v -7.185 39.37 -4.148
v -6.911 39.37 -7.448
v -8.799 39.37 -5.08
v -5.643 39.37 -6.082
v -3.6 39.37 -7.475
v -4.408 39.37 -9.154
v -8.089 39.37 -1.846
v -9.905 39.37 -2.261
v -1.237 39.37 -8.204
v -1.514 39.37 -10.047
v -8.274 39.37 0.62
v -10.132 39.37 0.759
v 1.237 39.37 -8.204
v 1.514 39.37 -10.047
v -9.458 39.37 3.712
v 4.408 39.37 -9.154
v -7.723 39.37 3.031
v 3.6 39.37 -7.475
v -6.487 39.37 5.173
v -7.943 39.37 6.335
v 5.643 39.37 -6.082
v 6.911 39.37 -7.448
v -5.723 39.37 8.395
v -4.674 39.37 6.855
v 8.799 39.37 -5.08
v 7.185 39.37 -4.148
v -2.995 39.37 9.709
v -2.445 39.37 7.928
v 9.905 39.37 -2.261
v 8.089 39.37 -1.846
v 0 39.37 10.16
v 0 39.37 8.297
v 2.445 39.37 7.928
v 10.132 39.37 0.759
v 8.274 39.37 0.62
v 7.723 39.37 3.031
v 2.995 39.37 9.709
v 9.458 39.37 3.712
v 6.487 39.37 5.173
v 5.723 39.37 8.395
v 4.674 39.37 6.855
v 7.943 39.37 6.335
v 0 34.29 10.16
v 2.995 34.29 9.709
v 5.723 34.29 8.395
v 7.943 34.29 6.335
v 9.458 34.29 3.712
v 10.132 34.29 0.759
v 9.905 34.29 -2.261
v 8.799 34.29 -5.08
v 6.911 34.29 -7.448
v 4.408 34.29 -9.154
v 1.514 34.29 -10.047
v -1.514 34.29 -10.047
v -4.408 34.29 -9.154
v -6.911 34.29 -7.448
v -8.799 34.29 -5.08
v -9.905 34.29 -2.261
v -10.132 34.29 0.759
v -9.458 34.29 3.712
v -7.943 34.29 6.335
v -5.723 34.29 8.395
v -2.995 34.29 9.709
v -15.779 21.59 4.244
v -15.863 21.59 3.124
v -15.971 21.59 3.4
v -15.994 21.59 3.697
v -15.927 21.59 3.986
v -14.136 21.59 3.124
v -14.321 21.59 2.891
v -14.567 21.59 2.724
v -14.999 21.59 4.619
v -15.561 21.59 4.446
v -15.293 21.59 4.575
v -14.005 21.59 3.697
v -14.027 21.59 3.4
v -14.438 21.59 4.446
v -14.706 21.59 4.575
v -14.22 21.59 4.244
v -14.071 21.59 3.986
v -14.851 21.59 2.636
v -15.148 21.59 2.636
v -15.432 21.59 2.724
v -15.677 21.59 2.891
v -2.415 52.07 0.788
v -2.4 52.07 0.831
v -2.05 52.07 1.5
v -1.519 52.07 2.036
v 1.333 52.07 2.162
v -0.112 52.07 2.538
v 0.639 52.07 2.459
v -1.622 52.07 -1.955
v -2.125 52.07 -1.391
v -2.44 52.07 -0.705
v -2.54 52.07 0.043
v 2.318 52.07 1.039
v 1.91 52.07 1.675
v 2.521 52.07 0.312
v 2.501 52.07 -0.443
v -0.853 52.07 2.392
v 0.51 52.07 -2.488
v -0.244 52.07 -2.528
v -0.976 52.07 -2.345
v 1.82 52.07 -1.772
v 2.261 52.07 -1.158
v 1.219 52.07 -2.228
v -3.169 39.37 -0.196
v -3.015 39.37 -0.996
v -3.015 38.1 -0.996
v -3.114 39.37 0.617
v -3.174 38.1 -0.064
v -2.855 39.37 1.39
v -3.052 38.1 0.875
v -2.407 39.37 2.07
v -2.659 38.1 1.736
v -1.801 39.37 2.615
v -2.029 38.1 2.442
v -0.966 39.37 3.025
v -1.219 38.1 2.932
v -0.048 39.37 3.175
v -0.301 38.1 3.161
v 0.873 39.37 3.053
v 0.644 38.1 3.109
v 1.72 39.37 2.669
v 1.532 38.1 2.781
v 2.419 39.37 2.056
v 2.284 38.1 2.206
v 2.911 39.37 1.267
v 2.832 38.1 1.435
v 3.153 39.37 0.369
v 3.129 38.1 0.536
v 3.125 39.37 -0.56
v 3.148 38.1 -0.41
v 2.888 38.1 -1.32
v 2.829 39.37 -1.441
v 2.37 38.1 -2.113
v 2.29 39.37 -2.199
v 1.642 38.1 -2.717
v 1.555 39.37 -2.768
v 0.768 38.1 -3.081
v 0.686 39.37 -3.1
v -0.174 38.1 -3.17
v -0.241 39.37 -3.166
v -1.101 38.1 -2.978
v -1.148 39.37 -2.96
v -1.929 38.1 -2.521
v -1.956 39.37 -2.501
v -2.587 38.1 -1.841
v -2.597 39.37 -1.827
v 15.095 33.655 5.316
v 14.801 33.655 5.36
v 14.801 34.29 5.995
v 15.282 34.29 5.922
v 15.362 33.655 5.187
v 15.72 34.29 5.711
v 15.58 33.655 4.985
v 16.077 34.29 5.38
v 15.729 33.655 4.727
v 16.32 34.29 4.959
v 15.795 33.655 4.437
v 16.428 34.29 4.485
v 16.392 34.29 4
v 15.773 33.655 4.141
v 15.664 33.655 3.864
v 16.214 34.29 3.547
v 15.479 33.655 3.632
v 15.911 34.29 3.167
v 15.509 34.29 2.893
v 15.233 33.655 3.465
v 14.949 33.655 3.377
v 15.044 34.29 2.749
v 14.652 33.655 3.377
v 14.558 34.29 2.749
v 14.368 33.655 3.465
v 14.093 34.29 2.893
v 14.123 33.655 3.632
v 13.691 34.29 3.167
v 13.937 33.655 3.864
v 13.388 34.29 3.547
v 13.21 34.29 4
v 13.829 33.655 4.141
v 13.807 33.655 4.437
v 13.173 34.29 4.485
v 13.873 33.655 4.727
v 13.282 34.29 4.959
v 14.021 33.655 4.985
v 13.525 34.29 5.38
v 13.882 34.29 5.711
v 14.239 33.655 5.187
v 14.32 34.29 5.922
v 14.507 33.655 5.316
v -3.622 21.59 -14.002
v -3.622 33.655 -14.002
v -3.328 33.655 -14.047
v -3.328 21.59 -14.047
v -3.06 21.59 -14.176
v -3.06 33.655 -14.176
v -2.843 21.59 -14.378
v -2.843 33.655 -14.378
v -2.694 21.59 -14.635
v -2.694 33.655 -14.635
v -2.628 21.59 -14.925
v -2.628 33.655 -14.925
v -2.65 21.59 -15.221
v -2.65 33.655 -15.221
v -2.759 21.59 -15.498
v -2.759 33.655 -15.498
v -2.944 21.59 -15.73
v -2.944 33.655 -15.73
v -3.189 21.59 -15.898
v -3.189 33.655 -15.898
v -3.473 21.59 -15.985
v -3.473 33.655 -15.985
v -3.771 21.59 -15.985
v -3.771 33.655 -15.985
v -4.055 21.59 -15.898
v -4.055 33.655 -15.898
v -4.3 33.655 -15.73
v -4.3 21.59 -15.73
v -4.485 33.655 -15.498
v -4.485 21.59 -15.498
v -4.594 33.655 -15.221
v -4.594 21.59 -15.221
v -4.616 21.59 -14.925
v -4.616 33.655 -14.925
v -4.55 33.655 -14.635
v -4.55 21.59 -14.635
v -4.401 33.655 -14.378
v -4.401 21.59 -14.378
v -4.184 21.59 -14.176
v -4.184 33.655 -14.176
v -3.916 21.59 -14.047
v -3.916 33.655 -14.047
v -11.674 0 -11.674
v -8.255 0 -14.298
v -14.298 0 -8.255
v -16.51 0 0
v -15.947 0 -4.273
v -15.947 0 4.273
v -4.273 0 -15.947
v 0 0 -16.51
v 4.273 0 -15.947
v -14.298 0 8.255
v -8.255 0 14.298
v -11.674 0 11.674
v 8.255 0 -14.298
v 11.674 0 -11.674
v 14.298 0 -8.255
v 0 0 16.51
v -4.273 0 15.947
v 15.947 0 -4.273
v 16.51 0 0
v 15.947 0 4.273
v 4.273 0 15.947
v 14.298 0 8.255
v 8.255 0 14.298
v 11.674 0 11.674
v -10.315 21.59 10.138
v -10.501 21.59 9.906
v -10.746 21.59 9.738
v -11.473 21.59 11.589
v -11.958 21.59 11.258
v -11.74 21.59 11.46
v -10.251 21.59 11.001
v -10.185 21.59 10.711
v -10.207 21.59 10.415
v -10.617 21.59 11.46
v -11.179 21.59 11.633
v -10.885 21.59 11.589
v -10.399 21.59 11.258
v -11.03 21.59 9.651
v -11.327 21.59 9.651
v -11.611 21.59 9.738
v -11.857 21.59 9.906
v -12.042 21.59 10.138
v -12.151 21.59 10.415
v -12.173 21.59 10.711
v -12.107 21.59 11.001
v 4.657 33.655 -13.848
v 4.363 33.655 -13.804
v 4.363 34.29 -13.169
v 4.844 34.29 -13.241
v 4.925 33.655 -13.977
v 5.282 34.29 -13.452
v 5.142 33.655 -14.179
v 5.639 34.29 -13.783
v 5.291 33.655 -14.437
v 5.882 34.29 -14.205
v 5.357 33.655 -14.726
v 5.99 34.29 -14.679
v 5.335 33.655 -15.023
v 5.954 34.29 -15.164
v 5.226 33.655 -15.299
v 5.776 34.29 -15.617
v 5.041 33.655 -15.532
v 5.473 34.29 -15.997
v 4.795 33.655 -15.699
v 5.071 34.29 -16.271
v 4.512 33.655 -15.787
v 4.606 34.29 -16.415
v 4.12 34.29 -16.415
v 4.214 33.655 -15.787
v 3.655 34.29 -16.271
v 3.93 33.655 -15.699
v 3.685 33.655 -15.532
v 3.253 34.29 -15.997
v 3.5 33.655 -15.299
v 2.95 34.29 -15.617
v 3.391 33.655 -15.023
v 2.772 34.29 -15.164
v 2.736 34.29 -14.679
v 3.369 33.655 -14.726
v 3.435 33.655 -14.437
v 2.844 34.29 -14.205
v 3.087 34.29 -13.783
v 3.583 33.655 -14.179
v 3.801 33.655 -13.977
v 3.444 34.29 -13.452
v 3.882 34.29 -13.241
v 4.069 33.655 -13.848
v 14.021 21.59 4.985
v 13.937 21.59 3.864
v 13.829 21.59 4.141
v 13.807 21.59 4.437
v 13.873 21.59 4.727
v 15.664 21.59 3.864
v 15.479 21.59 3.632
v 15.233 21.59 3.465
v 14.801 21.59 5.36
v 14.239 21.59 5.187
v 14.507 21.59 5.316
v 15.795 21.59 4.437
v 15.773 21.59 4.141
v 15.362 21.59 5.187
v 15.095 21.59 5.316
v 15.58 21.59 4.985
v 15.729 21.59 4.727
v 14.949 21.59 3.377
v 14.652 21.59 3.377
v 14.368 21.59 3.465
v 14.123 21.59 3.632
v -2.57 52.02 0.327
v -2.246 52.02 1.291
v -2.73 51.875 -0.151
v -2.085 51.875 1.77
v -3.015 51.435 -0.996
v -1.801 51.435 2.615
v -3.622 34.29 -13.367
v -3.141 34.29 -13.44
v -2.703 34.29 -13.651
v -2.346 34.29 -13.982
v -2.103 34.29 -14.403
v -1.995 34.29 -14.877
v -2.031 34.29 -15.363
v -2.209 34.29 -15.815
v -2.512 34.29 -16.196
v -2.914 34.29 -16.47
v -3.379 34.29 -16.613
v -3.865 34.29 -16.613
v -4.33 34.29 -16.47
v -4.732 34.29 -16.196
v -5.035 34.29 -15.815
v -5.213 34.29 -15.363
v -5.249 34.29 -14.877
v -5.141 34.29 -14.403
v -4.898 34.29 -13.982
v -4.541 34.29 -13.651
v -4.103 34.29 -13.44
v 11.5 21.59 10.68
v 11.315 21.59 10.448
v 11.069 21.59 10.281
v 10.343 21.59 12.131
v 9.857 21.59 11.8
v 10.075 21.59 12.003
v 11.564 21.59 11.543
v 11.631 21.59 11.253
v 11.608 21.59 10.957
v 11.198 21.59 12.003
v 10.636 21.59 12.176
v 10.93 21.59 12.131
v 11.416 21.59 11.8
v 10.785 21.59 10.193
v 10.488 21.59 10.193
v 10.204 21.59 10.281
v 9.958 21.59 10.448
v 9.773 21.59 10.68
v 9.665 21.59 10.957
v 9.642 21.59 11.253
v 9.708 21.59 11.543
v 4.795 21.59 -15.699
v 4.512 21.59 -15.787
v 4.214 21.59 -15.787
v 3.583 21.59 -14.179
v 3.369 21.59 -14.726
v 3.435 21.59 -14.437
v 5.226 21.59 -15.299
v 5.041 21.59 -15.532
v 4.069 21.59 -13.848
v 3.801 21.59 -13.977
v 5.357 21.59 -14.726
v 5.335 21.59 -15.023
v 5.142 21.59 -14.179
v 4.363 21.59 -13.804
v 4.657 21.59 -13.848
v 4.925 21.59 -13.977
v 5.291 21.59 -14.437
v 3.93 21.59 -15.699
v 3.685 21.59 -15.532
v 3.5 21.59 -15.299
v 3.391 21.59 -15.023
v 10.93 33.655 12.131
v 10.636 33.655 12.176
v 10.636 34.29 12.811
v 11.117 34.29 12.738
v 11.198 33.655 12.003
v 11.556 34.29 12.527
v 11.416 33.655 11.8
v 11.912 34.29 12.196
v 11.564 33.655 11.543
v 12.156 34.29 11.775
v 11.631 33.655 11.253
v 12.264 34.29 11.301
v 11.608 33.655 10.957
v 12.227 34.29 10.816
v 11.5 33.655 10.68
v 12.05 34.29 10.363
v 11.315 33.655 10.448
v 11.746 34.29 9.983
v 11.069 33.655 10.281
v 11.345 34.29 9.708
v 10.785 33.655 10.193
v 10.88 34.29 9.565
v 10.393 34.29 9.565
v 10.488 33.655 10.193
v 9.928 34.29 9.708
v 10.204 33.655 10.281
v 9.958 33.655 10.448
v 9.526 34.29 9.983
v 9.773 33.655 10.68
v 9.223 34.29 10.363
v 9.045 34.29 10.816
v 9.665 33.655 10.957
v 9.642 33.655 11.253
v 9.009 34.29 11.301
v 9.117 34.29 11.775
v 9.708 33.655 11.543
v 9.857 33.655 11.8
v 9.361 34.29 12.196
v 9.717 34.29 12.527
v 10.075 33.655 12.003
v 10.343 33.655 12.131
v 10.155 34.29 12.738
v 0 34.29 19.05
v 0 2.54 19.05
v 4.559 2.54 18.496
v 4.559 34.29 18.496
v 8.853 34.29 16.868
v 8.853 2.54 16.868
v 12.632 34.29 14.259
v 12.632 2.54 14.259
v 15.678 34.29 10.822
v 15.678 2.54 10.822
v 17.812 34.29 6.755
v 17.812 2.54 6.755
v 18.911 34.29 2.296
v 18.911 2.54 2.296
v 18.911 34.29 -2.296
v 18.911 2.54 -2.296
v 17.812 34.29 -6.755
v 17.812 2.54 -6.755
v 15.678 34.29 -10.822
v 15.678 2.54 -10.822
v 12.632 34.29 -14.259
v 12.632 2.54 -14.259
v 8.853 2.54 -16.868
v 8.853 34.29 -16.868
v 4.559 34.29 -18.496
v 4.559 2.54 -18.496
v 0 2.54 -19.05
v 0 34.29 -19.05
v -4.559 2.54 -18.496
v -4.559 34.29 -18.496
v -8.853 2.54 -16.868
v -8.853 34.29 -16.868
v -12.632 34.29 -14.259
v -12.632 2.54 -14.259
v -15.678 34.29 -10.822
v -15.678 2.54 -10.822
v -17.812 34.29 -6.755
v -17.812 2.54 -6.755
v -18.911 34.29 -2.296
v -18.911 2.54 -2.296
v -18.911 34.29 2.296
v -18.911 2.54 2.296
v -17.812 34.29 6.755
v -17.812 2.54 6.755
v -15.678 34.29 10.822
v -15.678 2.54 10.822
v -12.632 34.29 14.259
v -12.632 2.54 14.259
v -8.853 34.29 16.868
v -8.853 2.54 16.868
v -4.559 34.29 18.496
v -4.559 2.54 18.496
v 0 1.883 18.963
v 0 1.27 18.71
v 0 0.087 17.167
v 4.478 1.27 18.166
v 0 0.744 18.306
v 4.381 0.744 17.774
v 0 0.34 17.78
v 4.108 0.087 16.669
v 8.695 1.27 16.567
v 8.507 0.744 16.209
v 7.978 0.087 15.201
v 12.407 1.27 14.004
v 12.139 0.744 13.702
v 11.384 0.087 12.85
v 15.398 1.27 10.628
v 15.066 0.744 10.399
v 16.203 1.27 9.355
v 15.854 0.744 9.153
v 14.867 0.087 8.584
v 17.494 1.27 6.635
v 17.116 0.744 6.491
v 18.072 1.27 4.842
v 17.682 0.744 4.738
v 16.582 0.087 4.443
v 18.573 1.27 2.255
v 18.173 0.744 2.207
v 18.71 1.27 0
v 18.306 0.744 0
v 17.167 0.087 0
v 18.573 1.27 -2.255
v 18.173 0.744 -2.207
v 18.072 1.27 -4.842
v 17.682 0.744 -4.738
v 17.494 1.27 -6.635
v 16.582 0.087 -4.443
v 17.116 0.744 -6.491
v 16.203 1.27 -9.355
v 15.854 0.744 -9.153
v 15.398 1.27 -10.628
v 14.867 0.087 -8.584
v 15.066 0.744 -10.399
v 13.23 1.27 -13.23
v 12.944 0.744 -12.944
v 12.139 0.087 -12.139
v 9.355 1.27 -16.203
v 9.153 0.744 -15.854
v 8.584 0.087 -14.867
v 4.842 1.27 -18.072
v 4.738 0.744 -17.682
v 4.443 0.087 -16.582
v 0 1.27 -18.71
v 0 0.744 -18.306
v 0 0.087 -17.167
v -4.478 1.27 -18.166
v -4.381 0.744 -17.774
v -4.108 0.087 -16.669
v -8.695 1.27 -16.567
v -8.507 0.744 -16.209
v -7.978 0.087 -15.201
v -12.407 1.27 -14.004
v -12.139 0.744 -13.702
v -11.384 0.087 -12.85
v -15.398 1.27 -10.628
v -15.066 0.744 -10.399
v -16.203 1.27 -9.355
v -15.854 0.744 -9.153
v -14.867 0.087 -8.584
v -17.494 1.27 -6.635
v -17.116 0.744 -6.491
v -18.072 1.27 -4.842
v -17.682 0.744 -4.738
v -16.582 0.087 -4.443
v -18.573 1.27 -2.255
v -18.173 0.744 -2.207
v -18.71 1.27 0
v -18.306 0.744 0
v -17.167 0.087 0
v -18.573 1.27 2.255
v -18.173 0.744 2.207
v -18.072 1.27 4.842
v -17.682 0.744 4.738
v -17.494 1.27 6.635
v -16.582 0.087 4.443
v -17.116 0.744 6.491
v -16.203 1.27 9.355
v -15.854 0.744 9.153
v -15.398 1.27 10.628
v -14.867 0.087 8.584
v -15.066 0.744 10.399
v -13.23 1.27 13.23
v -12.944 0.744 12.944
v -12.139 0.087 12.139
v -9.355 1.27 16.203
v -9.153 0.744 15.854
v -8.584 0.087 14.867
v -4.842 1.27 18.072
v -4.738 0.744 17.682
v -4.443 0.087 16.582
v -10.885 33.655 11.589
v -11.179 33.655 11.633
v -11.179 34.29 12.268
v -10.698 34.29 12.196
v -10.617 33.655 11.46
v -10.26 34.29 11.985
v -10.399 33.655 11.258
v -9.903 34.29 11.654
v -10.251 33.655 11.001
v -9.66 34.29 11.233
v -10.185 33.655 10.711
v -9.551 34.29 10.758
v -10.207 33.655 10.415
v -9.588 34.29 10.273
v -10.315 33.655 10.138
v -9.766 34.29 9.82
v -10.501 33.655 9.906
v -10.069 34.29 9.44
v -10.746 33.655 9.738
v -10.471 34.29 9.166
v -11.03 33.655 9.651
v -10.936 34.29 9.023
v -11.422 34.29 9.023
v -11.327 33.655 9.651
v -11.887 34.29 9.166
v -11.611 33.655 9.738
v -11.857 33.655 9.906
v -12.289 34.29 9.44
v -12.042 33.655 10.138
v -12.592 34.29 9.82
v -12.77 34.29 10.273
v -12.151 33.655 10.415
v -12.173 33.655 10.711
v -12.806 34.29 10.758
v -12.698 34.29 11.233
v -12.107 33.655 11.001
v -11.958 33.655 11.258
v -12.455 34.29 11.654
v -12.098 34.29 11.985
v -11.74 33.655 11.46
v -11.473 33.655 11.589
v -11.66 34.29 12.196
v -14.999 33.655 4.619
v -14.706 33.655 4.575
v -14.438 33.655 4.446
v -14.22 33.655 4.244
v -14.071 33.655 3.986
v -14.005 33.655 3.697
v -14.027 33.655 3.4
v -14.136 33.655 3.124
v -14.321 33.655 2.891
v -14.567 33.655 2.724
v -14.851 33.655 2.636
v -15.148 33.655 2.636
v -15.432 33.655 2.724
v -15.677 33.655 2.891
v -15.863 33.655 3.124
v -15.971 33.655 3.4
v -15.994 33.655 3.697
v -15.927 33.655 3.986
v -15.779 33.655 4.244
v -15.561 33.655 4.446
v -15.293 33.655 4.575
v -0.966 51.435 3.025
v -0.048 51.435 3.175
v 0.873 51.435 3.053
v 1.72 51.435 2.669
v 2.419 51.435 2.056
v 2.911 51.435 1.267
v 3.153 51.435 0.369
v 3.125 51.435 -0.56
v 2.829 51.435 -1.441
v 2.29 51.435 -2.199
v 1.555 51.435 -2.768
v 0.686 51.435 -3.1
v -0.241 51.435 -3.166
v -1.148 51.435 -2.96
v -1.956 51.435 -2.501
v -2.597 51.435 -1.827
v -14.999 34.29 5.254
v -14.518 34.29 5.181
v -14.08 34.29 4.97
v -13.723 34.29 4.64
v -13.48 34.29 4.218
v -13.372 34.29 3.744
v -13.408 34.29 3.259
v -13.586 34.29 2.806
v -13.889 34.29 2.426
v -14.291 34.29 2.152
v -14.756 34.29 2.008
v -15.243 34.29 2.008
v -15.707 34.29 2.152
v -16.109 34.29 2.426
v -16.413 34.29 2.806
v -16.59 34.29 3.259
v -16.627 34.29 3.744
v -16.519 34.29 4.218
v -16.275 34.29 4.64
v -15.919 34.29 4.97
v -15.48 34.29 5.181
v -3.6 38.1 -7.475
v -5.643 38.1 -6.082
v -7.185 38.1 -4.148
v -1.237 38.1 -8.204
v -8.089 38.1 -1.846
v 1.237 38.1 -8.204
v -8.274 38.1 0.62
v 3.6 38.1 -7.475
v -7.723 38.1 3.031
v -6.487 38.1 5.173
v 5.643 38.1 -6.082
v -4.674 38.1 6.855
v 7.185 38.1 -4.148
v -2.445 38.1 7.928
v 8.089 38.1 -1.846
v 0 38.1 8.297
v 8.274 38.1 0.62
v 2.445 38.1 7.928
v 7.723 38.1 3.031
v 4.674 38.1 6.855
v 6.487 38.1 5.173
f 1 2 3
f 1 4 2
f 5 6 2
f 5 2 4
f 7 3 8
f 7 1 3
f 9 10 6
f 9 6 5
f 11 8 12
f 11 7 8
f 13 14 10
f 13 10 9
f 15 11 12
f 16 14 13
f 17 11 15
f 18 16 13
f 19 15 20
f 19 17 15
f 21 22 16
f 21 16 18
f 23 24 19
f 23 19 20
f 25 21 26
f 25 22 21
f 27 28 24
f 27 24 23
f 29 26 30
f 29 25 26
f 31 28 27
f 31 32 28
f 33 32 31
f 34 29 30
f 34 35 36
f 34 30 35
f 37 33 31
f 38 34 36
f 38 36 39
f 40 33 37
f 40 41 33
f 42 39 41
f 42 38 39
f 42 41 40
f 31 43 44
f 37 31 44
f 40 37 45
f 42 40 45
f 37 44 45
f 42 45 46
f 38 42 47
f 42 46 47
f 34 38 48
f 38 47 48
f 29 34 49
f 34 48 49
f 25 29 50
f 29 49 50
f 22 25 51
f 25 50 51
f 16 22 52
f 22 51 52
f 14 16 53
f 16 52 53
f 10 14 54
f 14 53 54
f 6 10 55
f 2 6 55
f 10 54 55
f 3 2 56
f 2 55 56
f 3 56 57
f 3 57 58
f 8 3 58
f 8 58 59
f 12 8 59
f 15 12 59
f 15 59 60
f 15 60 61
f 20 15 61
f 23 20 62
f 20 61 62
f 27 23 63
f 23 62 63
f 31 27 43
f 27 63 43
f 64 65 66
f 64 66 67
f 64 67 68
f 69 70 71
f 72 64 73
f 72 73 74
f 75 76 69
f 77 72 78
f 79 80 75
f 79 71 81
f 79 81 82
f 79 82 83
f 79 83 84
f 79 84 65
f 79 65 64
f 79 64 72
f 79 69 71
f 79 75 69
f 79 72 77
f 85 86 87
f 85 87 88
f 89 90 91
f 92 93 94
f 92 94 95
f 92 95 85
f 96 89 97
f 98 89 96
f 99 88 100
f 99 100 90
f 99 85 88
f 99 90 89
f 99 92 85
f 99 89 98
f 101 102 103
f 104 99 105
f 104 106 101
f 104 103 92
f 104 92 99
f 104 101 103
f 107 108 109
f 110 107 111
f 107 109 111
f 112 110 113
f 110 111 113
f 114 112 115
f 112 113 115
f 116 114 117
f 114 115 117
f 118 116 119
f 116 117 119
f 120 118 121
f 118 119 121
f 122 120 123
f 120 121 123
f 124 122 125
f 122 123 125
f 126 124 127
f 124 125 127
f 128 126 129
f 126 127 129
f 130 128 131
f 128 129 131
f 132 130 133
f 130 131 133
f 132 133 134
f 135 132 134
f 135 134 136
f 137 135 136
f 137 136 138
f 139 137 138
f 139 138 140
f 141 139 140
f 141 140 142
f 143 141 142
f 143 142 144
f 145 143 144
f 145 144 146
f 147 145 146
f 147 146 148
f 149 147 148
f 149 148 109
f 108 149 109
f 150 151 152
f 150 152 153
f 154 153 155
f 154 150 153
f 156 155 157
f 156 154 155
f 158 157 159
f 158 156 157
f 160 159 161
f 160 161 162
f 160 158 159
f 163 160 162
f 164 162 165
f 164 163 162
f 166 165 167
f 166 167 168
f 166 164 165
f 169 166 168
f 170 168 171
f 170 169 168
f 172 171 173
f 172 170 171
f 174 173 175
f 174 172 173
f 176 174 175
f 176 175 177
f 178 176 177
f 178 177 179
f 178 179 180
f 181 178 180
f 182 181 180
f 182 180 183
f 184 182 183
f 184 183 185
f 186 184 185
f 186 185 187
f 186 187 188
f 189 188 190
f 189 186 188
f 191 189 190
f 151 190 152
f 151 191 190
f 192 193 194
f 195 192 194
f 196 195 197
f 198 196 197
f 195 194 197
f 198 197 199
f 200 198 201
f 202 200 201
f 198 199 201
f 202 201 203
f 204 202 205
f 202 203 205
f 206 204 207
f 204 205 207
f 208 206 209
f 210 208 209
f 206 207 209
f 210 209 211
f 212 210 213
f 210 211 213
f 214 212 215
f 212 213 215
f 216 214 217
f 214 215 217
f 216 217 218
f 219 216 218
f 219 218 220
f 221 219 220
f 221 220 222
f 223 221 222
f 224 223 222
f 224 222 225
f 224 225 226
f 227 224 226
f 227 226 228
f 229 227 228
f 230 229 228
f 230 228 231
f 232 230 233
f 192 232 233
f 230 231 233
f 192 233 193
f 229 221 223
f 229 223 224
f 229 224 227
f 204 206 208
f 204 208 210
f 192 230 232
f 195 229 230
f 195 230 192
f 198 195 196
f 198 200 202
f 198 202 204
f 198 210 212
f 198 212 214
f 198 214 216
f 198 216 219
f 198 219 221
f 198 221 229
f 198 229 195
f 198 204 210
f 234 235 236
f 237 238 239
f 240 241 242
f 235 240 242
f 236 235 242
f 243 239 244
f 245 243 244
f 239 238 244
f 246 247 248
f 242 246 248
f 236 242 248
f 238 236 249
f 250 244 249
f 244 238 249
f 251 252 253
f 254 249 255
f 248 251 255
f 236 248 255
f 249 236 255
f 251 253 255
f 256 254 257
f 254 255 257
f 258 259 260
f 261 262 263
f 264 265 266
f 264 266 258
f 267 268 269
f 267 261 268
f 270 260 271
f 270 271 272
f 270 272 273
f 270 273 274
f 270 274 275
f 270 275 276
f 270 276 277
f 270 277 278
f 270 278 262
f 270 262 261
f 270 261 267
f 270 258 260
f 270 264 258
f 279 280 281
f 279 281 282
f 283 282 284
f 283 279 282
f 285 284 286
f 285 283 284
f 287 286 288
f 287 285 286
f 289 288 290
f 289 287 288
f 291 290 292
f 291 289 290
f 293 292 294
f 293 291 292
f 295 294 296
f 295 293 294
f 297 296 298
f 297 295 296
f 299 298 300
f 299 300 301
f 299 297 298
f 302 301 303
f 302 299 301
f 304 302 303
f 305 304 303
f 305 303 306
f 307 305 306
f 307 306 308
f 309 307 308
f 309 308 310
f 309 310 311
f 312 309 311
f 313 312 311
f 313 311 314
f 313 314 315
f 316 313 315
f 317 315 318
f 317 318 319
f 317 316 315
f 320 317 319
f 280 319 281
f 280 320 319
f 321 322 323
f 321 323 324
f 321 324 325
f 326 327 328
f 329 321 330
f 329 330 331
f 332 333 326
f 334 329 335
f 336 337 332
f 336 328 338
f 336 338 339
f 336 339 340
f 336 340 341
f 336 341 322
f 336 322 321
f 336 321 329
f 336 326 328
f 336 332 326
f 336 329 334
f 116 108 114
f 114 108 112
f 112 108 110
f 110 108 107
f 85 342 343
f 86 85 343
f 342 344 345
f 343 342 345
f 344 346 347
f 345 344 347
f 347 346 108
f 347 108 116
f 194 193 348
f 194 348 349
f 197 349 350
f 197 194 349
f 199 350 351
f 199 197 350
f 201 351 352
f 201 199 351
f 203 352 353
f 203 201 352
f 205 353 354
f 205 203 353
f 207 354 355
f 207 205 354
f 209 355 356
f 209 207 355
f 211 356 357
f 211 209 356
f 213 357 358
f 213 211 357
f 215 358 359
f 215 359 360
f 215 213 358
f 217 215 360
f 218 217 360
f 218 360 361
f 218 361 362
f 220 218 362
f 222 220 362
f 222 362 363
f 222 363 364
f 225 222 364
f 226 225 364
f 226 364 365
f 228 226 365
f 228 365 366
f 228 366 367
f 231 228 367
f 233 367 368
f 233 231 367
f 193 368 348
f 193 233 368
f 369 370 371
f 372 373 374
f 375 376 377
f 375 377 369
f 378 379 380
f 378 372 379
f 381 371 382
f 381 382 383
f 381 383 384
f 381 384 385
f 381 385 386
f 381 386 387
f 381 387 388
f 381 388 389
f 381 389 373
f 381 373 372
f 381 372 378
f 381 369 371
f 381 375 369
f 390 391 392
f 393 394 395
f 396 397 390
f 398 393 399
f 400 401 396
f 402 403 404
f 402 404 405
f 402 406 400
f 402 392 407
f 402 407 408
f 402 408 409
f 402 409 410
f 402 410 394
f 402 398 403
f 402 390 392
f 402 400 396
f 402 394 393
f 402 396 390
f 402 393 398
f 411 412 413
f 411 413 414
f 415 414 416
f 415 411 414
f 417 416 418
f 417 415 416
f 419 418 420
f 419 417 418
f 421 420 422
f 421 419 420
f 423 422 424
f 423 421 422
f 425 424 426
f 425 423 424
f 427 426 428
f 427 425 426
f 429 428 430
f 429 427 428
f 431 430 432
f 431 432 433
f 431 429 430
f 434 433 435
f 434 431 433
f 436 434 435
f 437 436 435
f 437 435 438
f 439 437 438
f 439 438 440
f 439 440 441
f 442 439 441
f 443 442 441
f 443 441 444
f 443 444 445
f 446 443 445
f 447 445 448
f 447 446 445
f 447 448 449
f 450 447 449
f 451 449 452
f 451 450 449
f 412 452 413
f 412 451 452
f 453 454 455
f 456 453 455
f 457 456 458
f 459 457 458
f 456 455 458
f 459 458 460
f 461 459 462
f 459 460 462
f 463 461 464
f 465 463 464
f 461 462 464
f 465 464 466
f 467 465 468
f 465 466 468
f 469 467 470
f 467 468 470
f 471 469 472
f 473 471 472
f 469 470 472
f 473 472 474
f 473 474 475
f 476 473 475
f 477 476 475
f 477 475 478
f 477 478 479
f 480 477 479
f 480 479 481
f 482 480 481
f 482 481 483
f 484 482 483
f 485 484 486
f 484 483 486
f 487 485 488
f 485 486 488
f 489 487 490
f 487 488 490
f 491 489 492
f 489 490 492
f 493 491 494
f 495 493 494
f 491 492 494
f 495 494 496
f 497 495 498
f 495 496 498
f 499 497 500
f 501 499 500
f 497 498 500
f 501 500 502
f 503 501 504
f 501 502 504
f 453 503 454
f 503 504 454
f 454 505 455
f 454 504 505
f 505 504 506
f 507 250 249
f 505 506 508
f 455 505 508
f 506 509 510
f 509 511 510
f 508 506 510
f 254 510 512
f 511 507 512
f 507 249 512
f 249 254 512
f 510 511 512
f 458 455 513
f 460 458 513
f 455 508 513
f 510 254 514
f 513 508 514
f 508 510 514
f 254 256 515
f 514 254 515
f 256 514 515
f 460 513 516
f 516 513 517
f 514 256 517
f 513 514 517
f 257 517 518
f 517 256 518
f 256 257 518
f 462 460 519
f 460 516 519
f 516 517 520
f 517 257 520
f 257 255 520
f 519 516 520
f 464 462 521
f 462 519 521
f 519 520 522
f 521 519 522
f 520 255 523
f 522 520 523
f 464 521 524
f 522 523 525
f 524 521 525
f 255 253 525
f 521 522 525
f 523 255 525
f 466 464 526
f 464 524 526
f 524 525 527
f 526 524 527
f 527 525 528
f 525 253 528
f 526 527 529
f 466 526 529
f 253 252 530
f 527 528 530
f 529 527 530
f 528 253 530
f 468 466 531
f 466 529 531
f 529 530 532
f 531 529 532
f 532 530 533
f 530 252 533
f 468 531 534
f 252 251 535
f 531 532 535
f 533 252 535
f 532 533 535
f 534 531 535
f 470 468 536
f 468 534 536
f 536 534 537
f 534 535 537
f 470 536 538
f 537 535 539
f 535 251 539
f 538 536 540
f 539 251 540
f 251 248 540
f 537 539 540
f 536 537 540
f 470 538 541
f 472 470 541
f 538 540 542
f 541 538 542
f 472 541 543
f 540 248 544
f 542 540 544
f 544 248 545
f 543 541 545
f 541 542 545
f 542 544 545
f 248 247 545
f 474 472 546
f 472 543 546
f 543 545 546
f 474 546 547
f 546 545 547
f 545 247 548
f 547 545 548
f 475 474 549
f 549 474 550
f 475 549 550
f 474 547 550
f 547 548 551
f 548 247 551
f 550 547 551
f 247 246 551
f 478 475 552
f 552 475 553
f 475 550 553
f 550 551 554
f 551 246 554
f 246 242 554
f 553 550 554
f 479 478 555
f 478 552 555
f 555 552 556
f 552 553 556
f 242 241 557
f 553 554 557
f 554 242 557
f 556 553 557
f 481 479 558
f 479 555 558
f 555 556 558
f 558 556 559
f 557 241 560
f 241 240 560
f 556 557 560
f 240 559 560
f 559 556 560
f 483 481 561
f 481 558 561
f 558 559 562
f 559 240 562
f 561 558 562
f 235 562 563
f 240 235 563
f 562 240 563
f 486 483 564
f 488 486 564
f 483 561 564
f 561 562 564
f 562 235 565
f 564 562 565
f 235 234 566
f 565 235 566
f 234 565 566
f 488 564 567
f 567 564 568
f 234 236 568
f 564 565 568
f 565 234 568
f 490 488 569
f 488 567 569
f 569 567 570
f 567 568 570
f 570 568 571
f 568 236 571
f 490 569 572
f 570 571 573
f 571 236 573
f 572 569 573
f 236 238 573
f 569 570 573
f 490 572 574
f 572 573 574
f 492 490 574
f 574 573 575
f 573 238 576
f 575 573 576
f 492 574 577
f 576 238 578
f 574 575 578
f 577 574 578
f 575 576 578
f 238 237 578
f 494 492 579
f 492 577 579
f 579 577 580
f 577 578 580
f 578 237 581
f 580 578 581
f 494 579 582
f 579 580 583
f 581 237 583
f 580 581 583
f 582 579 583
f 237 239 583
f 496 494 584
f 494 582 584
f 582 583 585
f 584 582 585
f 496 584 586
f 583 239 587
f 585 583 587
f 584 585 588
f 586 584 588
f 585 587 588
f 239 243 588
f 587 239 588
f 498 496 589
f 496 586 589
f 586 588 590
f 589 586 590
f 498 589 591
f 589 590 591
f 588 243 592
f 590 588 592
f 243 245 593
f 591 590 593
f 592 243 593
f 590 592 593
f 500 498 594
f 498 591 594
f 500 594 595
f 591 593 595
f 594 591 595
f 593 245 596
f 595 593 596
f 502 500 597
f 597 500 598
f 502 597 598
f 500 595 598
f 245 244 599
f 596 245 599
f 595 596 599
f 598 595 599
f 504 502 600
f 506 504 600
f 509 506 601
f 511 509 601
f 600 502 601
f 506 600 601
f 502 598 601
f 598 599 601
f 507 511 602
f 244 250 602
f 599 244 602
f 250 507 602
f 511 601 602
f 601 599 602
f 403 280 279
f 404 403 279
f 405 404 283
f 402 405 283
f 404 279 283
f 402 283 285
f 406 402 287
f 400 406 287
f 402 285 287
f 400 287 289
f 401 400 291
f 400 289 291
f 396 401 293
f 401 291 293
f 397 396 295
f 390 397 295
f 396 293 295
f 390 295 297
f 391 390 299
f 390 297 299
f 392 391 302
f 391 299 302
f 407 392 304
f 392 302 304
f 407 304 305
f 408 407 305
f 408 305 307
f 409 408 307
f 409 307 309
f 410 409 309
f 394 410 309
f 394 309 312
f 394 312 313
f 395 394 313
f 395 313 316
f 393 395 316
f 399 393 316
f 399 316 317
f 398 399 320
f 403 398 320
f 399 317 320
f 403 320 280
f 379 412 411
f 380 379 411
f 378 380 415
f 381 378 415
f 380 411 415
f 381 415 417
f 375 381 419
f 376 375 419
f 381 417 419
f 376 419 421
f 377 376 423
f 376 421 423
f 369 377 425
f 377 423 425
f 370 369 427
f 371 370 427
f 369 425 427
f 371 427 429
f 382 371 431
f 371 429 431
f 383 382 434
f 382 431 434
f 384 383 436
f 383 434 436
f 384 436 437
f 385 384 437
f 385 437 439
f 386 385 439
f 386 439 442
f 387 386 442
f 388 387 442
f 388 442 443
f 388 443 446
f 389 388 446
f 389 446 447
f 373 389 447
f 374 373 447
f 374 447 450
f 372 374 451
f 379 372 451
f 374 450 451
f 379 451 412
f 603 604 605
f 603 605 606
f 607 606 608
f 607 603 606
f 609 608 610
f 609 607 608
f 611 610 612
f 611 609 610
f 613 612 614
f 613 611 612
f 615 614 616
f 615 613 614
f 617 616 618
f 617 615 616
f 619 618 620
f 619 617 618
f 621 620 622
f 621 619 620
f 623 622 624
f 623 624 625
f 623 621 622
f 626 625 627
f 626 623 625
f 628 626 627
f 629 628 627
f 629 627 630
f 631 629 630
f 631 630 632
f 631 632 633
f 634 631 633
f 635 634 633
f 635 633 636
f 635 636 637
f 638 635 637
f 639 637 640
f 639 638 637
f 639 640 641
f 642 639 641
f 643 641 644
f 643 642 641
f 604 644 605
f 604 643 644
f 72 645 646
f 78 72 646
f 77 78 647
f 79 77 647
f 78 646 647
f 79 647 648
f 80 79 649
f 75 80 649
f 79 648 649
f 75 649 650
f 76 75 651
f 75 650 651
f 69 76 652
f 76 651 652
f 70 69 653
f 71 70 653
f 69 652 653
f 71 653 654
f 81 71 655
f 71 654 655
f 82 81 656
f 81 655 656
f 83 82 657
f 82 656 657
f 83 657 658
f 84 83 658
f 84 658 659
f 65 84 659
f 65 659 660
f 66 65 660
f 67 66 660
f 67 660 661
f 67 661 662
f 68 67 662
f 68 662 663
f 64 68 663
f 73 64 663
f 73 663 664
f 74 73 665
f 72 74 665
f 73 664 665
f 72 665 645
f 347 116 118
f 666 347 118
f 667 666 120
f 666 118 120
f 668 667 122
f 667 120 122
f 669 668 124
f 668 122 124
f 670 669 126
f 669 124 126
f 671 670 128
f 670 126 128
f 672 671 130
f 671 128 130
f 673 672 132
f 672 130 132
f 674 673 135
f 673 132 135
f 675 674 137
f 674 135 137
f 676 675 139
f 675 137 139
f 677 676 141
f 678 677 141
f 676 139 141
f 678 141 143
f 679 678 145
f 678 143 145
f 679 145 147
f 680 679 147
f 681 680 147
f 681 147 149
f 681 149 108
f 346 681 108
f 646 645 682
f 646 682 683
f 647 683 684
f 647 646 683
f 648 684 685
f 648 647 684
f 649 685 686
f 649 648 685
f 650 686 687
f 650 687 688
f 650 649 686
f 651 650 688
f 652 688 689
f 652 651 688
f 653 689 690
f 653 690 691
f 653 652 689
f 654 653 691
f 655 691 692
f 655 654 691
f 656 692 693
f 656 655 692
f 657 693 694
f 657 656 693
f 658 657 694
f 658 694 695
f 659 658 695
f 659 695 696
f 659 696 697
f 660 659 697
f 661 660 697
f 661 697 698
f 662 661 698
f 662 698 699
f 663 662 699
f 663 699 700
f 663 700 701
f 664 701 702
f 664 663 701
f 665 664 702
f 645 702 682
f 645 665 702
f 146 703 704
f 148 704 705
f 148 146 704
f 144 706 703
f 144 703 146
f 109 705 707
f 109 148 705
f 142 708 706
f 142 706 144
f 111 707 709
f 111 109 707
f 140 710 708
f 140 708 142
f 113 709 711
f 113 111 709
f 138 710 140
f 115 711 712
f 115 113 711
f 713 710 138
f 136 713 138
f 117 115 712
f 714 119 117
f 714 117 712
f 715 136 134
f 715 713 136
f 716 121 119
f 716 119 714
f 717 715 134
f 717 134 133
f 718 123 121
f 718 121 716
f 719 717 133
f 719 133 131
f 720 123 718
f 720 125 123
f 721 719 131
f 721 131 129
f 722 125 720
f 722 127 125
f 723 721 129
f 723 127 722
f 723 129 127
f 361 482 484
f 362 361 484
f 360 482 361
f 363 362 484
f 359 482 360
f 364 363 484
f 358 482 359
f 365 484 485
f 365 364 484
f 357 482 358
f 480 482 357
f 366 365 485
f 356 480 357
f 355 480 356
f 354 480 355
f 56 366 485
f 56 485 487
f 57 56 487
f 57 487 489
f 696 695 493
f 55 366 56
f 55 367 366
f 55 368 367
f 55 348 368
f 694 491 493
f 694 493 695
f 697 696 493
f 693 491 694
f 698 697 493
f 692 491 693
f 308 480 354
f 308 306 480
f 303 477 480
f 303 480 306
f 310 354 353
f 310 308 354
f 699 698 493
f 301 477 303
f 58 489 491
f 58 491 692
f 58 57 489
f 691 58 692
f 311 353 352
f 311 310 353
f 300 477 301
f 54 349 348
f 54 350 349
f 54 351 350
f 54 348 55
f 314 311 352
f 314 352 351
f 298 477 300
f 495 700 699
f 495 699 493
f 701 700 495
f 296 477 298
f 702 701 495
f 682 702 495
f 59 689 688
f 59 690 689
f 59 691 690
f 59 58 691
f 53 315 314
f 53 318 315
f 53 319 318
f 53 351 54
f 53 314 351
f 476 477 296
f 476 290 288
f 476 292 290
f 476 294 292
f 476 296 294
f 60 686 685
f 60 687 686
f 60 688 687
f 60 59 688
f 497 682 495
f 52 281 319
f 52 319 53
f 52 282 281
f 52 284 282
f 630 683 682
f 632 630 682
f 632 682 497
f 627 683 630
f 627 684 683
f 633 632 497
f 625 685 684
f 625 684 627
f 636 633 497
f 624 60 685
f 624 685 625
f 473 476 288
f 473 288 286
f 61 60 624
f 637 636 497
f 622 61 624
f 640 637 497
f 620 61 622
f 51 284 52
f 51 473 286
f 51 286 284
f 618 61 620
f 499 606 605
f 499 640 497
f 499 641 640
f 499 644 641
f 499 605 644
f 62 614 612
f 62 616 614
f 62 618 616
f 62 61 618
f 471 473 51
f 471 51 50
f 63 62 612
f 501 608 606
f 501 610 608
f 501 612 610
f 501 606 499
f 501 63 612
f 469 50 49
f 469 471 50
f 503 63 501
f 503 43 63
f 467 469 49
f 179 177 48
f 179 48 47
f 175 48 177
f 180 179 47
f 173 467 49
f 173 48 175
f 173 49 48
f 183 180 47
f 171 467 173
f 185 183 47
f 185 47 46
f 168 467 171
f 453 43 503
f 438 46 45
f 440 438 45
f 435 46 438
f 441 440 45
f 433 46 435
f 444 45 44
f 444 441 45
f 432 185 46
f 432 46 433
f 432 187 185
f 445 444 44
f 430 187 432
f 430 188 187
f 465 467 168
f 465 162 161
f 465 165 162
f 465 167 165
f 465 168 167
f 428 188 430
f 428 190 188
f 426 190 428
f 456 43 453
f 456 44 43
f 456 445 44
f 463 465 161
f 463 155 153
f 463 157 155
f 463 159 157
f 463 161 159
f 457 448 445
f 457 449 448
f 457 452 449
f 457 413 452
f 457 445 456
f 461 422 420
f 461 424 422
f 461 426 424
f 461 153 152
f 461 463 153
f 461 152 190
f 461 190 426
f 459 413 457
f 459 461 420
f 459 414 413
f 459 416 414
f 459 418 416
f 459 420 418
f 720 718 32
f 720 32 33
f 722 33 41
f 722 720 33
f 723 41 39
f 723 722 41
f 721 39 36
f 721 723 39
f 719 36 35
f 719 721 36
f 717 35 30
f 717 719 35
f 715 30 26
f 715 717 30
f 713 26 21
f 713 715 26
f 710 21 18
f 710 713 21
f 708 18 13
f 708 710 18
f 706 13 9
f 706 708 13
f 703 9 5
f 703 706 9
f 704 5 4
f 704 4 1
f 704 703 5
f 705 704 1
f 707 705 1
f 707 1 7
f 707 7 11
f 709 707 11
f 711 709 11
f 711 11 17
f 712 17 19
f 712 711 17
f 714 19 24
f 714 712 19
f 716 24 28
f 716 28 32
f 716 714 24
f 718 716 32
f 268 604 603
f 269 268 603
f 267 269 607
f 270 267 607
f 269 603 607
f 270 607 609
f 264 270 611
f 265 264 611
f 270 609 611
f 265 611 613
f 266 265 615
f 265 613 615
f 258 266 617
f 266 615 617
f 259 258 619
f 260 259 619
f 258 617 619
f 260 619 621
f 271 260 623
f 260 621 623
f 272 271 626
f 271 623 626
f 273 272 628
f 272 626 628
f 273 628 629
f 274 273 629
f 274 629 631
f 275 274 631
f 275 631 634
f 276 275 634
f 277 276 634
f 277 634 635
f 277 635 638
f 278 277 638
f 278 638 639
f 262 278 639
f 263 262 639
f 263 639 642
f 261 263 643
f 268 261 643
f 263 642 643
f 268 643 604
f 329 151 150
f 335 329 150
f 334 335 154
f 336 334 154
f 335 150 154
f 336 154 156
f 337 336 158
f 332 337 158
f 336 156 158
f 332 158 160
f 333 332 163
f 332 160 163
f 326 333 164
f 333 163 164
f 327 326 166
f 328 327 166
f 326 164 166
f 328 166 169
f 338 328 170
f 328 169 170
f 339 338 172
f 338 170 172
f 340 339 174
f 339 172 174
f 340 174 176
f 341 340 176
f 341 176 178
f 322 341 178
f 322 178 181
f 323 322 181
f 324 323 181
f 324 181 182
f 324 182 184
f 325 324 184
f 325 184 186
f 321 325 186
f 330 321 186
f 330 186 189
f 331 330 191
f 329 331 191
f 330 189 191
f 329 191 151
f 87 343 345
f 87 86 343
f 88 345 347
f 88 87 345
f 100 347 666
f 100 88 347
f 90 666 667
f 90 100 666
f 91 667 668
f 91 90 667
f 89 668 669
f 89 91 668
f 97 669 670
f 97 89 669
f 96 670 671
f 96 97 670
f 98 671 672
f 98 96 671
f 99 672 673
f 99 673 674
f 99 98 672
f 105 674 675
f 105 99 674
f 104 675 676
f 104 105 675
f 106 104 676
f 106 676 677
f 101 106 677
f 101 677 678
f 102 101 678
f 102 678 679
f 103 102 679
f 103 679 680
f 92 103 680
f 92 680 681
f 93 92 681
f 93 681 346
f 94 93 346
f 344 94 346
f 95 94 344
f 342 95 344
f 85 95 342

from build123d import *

# Parameters (mm, degrees)
SKETCH1_R           = 19.05
BOSS_EXTRUDE1_DEPTH = 34.29
SKETCH3_R           = 10.16
BOSS_EXTRUDE3_DEPTH = 5.08
BOSS_EXTRUDE4_DEPTH = 12.7
FILLET1_R           = 2.54
CHAMFER1_SIZE       = 0.635
SKETCH5_R           = 0.99695
CUT_EXTRUDE1_DEPTH  = 12.7
CHAMFER2_SIZE       = 0.635
CUT_EXTRUDE2_START  = -1.27
SKETCH6_R           = 8.296715315
SKETCH6_R_2         = 3.175
CUT_EXTRUDE2_DEPTH  = 1.27


with BuildPart() as part:
    # Sketch1 → Boss-Extrude1 (new body)
    with BuildSketch(Plane(origin=(0, 0, 0), x_dir=(1, 0, 0), z_dir=(0, 1, 0))):
        with Locations(Location((0, 0, 0), (0, 0, 270))):
            Circle(SKETCH1_R)
    extrude(amount=BOSS_EXTRUDE1_DEPTH)

    # Sketch3 → Boss-Extrude3 (add)
    with BuildSketch(Plane(origin=(0, 34.29, 0), x_dir=(1, 0, 0), z_dir=(0, 1, 0))):
        with Locations(Location((0, 0, 0), (0, 0, 270))):
            Circle(SKETCH3_R)
    extrude(amount=BOSS_EXTRUDE3_DEPTH)

    # Sketch4 → Boss-Extrude4 (add)
    with BuildSketch(Plane(origin=(0, 39.37, 0), x_dir=(1, 0, 0), z_dir=(0, 1, 0))):
        with BuildLine():
            Line((-3.01459652, 0.996409965), (-1.800640593, -2.615017869))
            ThreePointArc((-1.800640593, -2.615017869), (3.009523196, 1.01162994), (-3.01459652, 0.996409965))
        make_face()
    extrude(amount=BOSS_EXTRUDE4_DEPTH)

    # Fillet1
    fillet1_edges = [part.edges().sort_by_distance(p)[0] for p in [
        (0, 0, -19.05),
    ]]
    fillet(fillet1_edges, radius=FILLET1_R)

    # Chamfer1
    chamfer1_edges = [part.edges().sort_by_distance(p)[0] for p in [
        (3.009523196, 52.07, -1.01162994),
    ]]
    chamfer(chamfer1_edges, length=CHAMFER1_SIZE - 0.0001)  # a hair under: the kernel refuses the full size

    # Sketch5 → Cut-Extrude1 (cut)
    with BuildSketch(Plane(origin=(0, 34.29, 0), x_dir=(1, 0, 0), z_dir=(0, 1, 0))):
        with Locations(Location((-11.178825066, -10.636456195, 0), (0, 0, 270))):
            Circle(SKETCH5_R)
        with Locations(Location((-14.999374589, -3.622028738, 0), (0, 0, 270))):
            Circle(SKETCH5_R)
        with Locations(Location((-3.622028738, 14.999374589, 0), (0, 0, 270))):
            Circle(SKETCH5_R)
        with Locations(Location((4.362918394, 14.800853804, 0), (0, 0, 270))):
            Circle(SKETCH5_R)
        with Locations(Location((14.800853804, -4.362918394, 0), (0, 0, 270))):
            Circle(SKETCH5_R)
        with Locations(Location((10.636456195, -11.178825066, 0), (0, 0, 270))):
            Circle(SKETCH5_R)
    extrude(amount=-CUT_EXTRUDE1_DEPTH, mode=Mode.SUBTRACT)

    # Chamfer2
    chamfer2_edges = [part.edges().sort_by_distance(p)[0] for p in [
        (10.636456195, 34.29, 10.181875066),
        (14.800853804, 34.29, 3.365968394),
        (4.362918394, 34.29, -15.797803804),
        (-3.622028738, 34.29, -15.996324589),
        (-14.999374589, 34.29, 2.625078738),
        (-11.178825066, 34.29, 9.639506195),
    ]]
    chamfer(chamfer2_edges, length=CHAMFER2_SIZE)

    # Sketch6 → Cut-Extrude2 (cut)
    with BuildSketch(Plane(origin=(0, 39.37, 0), x_dir=(1, 0, 0), z_dir=(0, 1, 0)).offset(CUT_EXTRUDE2_START)):
        with Locations(Location((0, 0, 0), (0, 0, 270))):
            Circle(SKETCH6_R)
        with Locations(Location((0, 0, 0), (0, 0, 161.709808999))):
            Circle(SKETCH6_R_2, mode=Mode.SUBTRACT)
    extrude(amount=CUT_EXTRUDE2_DEPTH, mode=Mode.SUBTRACT)


solid = part.part
